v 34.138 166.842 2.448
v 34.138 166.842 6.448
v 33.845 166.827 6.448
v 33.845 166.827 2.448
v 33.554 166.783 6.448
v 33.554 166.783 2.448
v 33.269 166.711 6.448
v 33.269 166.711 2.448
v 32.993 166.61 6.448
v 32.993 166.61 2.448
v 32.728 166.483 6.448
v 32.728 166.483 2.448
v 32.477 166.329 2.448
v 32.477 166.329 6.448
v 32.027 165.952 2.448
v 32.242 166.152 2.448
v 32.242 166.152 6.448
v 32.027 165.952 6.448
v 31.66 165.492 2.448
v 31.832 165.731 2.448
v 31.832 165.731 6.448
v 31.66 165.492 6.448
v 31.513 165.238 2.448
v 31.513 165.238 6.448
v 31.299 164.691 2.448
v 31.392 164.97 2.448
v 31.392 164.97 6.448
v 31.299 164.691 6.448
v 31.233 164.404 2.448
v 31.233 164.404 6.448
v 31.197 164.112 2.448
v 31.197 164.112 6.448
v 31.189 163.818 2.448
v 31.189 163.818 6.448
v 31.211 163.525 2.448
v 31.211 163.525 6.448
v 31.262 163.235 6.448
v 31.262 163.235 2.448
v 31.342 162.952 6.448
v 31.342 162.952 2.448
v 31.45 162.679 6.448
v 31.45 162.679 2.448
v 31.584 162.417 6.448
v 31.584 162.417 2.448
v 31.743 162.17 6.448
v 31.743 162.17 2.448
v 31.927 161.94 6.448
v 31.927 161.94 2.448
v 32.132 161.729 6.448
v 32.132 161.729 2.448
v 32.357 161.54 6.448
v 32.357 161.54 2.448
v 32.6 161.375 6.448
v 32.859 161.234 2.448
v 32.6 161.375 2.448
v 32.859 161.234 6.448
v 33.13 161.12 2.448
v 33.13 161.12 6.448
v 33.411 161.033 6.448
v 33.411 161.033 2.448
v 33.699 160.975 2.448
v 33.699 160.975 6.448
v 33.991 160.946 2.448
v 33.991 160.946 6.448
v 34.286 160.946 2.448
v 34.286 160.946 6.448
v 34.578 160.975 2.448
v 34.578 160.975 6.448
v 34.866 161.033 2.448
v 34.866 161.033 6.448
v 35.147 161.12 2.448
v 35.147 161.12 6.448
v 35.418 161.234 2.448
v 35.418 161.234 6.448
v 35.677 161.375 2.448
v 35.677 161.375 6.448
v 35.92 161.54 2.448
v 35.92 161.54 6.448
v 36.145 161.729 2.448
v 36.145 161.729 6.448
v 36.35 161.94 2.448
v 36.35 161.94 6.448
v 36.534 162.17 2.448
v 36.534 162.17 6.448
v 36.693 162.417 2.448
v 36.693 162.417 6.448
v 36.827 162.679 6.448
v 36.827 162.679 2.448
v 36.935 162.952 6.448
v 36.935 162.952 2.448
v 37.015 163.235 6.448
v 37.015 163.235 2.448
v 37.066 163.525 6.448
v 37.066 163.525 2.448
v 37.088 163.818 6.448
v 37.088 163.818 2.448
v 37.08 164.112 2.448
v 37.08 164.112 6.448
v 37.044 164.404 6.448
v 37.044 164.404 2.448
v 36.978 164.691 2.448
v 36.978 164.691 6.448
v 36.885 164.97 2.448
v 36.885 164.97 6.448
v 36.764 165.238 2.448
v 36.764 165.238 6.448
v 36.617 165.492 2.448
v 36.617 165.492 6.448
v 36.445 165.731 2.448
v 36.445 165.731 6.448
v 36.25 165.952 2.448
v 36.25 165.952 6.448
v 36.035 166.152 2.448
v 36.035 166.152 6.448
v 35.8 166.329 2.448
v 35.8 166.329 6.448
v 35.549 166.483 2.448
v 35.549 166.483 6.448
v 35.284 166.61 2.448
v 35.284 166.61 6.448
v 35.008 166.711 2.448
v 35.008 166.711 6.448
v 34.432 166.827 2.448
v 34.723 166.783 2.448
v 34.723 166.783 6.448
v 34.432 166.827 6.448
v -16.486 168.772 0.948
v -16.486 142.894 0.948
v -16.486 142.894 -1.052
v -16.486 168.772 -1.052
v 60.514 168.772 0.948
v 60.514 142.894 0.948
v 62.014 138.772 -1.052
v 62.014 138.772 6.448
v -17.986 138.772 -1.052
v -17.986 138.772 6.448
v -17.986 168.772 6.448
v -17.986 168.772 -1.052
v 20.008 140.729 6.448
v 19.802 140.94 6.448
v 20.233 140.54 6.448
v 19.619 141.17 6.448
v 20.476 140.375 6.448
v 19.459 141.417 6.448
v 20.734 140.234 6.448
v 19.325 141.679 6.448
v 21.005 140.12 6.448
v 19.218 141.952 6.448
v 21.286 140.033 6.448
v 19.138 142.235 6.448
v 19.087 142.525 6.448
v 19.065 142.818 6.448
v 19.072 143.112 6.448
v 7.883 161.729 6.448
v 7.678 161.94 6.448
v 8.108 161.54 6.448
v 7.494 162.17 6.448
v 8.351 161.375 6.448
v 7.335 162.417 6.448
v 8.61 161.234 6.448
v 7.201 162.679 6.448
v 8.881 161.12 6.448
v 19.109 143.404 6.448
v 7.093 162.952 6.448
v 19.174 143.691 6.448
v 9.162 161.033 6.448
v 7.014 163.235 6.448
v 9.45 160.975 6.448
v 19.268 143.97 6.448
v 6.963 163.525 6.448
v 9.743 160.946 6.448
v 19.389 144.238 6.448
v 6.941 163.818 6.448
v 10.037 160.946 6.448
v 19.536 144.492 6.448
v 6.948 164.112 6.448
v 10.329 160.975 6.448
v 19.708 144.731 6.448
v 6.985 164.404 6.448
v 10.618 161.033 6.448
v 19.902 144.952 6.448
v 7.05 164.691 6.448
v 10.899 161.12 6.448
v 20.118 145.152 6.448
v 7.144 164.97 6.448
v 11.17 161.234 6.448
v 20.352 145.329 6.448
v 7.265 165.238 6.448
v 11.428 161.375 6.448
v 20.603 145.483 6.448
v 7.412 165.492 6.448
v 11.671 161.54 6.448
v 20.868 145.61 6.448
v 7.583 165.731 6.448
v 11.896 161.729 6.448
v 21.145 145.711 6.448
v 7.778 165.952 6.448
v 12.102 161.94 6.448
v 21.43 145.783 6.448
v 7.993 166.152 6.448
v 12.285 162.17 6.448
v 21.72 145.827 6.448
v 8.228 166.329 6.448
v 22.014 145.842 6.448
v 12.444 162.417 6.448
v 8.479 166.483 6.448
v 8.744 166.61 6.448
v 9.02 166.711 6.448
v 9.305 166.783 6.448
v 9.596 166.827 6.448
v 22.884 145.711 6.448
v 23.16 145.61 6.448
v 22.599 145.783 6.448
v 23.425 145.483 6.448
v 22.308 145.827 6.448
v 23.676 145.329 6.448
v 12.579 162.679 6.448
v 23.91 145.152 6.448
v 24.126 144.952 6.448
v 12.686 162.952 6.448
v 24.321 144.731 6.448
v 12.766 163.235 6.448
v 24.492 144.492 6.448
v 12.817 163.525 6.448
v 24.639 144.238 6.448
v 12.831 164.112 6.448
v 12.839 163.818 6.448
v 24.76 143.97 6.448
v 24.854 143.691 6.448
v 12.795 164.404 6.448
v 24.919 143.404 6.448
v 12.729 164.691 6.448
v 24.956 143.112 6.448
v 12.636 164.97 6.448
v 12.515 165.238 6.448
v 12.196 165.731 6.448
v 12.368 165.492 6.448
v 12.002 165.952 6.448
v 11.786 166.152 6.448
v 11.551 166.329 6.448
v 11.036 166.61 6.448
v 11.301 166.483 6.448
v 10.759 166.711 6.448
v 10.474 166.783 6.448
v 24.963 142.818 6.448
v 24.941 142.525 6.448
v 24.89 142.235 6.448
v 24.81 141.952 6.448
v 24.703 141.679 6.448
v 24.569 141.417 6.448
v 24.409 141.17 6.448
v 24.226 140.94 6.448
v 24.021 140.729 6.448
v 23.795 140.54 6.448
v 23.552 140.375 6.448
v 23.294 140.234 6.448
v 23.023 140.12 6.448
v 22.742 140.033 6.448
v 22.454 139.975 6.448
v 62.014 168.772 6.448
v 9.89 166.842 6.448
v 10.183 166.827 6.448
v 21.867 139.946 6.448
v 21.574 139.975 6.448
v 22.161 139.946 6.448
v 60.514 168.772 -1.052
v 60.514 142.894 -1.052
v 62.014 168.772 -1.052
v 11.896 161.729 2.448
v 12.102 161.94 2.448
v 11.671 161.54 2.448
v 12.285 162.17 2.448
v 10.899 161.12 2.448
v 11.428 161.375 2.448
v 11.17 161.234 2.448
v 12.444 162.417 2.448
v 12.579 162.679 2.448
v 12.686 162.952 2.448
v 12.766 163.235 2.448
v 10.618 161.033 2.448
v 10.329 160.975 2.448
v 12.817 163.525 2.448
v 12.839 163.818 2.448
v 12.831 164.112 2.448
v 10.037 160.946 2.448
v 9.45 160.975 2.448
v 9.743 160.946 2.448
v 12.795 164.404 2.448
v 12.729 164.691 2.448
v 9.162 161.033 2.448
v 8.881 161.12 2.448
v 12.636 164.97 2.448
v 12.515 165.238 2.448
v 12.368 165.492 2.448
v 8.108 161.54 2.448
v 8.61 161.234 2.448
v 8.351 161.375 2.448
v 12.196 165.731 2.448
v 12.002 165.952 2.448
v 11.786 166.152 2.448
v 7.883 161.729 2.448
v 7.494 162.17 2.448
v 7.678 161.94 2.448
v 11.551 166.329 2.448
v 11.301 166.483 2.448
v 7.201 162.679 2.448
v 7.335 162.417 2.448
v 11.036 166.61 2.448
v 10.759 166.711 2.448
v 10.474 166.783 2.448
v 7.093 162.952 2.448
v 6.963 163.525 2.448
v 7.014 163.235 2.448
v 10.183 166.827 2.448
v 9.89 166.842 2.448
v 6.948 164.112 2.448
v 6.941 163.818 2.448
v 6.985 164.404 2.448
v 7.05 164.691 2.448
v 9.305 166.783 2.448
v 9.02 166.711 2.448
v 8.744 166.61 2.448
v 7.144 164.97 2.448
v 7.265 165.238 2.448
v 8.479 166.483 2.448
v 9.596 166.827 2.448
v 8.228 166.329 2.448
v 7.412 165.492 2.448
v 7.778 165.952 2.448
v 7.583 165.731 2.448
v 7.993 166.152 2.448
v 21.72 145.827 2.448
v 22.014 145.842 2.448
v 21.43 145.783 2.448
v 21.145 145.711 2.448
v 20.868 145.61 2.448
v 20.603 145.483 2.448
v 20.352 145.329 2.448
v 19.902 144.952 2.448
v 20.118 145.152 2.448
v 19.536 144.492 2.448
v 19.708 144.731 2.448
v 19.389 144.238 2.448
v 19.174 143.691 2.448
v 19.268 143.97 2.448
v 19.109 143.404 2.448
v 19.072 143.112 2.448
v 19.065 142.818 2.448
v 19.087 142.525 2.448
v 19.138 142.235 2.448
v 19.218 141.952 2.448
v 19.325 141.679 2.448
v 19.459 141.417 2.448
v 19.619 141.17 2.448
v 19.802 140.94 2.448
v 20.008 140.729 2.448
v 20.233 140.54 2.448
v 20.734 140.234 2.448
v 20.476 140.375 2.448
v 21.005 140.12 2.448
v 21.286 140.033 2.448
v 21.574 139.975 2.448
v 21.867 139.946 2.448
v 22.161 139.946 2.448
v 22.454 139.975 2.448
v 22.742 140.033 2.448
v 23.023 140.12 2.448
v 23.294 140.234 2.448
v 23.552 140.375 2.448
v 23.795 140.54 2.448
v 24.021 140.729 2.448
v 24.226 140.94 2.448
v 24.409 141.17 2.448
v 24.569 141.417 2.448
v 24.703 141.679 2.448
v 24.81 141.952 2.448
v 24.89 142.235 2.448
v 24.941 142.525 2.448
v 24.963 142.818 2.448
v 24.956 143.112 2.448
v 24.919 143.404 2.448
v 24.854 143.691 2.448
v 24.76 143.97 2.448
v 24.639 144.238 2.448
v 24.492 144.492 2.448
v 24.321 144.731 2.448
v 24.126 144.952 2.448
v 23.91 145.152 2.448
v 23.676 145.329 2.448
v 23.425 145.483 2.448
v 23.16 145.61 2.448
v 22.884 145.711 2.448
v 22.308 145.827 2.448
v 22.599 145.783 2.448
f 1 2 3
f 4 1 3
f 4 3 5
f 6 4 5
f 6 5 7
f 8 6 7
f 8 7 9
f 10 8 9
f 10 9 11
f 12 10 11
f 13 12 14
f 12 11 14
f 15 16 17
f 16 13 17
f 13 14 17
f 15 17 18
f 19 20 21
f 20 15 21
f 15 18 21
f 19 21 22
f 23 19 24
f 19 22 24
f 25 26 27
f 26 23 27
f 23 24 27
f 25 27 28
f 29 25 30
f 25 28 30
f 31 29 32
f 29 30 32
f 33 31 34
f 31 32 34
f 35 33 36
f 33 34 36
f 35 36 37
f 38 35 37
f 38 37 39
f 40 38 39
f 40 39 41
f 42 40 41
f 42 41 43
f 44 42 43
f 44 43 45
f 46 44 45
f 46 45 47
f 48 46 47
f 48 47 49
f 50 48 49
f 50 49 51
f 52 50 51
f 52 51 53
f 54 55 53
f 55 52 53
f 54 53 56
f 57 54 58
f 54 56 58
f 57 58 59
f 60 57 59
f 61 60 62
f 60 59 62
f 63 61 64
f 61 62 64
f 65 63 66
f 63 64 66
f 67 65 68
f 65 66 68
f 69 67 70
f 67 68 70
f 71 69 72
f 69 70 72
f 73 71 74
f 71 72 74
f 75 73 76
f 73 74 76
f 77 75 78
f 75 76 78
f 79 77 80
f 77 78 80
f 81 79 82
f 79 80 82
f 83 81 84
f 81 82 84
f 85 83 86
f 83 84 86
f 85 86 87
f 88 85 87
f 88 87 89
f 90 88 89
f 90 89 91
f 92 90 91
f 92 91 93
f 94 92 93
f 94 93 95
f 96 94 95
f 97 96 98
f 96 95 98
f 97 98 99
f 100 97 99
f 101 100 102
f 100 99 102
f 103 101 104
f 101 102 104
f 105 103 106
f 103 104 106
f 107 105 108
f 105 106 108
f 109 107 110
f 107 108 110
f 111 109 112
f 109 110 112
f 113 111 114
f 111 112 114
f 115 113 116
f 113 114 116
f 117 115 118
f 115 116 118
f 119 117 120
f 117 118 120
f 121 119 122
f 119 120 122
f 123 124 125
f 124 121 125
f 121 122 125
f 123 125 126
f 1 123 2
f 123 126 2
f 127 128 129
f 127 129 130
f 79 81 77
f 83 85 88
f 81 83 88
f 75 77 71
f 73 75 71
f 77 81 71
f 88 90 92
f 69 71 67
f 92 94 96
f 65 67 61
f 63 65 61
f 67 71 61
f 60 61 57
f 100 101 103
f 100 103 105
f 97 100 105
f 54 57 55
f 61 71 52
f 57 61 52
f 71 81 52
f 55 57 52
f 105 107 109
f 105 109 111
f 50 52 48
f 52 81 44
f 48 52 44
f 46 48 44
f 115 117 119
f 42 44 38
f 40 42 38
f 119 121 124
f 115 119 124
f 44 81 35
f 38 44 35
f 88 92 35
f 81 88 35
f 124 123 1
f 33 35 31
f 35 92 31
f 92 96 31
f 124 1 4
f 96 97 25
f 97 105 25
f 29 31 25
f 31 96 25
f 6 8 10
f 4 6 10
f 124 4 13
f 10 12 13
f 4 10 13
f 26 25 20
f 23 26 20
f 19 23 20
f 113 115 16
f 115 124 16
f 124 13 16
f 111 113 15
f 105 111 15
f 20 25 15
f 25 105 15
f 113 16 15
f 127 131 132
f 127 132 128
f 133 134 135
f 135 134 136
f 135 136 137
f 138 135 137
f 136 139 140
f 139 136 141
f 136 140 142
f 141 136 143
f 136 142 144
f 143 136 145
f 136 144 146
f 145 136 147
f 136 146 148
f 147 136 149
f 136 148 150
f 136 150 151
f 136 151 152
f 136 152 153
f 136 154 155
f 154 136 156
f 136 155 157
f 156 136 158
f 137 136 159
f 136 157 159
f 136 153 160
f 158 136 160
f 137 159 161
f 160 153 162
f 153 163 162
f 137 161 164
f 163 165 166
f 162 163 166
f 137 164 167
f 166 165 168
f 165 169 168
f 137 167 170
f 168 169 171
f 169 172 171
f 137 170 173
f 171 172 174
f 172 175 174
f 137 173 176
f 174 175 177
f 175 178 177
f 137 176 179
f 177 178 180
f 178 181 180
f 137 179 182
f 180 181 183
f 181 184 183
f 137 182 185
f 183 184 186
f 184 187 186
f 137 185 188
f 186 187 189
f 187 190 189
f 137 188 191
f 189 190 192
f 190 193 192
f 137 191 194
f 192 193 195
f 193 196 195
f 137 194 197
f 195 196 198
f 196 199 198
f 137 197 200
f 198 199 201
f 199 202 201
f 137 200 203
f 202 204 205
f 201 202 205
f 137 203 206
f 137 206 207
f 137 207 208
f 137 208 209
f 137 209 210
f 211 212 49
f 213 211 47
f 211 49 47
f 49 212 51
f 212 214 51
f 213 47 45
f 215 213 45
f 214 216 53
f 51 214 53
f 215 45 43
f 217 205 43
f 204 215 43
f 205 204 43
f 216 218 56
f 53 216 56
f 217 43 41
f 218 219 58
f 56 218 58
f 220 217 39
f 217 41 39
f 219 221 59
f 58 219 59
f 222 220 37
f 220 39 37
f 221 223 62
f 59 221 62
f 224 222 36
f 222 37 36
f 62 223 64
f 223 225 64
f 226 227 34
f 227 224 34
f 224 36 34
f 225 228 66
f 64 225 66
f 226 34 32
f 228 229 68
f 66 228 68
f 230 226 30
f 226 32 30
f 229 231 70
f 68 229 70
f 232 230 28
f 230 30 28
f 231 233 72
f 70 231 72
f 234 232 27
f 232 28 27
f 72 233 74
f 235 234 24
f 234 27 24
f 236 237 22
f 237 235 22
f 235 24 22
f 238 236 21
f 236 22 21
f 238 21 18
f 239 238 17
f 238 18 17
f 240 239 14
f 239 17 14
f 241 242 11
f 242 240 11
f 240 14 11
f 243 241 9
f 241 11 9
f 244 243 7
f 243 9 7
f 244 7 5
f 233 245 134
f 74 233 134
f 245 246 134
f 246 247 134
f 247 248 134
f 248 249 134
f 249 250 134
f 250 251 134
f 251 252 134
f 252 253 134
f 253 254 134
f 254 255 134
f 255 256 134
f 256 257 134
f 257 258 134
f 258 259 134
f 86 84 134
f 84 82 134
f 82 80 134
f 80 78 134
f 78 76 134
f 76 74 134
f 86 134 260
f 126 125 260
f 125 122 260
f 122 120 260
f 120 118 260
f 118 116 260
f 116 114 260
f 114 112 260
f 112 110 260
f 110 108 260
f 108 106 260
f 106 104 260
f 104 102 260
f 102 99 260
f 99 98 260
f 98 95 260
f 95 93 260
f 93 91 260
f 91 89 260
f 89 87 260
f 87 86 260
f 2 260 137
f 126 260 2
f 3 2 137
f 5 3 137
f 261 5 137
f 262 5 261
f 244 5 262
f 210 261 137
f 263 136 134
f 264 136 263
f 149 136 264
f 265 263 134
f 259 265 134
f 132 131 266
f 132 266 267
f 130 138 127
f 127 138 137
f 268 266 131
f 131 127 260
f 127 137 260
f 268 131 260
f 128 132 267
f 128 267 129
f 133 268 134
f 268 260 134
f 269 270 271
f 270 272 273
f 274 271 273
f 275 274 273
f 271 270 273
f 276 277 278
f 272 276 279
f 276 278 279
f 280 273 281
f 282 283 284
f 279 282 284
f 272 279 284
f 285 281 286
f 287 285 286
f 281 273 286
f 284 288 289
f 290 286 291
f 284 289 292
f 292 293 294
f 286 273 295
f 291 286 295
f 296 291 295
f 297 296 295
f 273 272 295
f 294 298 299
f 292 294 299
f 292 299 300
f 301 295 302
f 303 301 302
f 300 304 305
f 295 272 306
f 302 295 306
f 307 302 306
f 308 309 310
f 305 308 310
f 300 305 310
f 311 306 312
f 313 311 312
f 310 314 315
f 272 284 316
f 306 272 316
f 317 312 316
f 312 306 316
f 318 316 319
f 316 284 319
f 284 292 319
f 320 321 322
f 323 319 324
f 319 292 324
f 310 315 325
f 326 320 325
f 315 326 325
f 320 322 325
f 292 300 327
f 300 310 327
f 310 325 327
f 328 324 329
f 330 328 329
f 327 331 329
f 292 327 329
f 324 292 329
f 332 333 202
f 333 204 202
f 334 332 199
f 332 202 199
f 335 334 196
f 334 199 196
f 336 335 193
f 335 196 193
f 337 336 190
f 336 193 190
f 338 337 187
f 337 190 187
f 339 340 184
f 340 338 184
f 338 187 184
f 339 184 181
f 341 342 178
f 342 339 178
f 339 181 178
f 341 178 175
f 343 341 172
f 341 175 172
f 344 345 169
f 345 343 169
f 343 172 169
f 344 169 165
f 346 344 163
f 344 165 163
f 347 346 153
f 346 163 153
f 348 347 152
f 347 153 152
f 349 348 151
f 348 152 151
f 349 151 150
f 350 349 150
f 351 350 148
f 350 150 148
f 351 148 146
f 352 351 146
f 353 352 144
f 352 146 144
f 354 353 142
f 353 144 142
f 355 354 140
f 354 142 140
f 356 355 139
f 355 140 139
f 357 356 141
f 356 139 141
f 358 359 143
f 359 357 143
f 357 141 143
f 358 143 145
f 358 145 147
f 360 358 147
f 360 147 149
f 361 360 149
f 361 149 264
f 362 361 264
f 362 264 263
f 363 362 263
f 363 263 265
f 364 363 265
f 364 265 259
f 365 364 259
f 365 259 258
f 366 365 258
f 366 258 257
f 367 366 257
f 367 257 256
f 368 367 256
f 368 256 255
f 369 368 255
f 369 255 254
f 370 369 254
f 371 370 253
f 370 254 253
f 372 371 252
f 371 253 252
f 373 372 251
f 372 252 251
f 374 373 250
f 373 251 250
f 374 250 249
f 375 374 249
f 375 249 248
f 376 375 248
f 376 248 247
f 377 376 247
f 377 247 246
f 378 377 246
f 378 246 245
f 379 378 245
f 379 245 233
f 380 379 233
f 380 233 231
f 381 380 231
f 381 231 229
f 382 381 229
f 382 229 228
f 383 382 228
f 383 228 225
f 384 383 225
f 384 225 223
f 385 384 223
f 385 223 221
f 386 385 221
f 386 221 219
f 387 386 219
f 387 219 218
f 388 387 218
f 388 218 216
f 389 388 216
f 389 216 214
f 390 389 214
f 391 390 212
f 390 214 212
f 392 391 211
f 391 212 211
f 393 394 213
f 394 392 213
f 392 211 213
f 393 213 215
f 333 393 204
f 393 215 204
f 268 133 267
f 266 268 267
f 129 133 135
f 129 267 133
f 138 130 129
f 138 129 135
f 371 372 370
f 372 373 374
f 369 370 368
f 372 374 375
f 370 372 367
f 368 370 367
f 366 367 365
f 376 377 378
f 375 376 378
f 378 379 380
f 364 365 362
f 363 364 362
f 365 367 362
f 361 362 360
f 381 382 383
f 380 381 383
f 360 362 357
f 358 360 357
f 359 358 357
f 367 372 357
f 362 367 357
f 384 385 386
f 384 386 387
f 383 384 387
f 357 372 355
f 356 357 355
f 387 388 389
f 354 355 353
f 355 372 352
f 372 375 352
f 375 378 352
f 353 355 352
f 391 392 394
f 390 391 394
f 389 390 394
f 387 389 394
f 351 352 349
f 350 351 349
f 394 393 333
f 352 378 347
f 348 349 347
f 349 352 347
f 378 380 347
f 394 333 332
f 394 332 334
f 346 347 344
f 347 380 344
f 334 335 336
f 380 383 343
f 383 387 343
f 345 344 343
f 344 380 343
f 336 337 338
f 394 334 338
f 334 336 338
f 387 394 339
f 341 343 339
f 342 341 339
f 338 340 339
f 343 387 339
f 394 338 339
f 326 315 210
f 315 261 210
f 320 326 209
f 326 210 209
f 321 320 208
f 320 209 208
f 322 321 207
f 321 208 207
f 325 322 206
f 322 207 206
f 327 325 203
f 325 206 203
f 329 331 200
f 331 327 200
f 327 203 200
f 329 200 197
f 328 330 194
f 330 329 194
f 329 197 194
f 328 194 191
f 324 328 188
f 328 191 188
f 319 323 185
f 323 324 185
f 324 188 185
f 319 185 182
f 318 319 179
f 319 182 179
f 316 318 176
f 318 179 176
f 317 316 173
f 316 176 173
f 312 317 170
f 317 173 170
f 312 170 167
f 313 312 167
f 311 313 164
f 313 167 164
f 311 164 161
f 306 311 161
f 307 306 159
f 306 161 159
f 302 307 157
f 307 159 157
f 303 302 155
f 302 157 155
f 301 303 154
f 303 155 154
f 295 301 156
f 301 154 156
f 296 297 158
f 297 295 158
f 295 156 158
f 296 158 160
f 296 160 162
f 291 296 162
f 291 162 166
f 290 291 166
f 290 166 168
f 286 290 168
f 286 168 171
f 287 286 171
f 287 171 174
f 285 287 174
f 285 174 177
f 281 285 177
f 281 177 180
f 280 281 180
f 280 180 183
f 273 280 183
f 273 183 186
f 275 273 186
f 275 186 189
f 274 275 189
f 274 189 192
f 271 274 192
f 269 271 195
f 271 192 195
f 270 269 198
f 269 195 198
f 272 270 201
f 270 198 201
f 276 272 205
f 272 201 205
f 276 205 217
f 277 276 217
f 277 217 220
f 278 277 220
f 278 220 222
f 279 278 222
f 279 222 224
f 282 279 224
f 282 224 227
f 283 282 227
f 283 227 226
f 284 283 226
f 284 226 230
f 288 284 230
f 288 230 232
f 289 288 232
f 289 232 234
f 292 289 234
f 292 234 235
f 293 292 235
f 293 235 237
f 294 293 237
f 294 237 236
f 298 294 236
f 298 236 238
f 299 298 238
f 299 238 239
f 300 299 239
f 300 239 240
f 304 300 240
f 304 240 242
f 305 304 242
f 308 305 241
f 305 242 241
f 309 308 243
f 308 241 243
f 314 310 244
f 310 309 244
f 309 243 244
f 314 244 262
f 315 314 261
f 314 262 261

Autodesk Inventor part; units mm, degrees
ref_plane "YZ Plane" through (0, 0, 0) normal (1, 0, 0) x (0, 1, 0)
ref_plane "XZ Plane" through (0, 0, 0) normal (0, 1, 0) x (-1, 0, 0)
ref_plane "XY Plane" through (0, 0, 0) normal (0, 0, 1) x (1, 0, 0)
ref_plane "Work Plane1" through (52.5141, 202.7033, 6.4479) normal (0, 0, -1) x (0, 1, 0)
sketch "Sketch1" plane through (52.5141, 202.7033, 6.4479) normal (0, 0, -1) x (0, 1, 0)
  circle A0 centre (-59.8114, -30.5) radius 2.95
  circle A1 centre (-38.8114, -18.3756) radius 2.95
  circle A2 centre (-38.8114, -42.6244) radius 2.95 construction
  circle A3 centre (-38.8114, -42.6244) radius 2.95
  line L0 (-38.8114, -42.6244) -> (-38.8114, -18.3756) construction
  line L1 (-38.8114, -18.3756) -> (-59.8114, -30.5) construction
  line L2 (-59.8114, -30.5) -> (-38.8114, -42.6244) construction
  line L3 (-63.9312, 9.5) -> (-63.9312, -70.5)
  line L4 (-63.9312, -70.5) -> (-33.9312, -70.5)
  line L5 (-33.9312, -70.5) -> (-33.9312, 9.5)
  line L6 (-33.9312, 9.5) -> (-63.9312, 9.5)
  line L7 (-63.9312, 9.5) -> (-33.9312, -70.5) construction
  line L8 (-63.9312, -70.5) -> (-33.9312, 9.5) construction
  point P0 (-202.7033, -52.5141)
  point P1 (-56.7146, -27.9576)
  point P2 (-59.6434, -27.5548)
  point P3 (-59.6434, -33.4452)
  dimension "d4" = 5.9
  dimension "d5" = 5.9
  dimension "d6" = 5.9
  dimension "d37" = 80
  dimension "d38" = 30
extrude "Extrusion1" add sketch "Sketch1" along normal blind 4
sketch "Sketch2" plane through (52.5141, 202.7033, 2.4479) normal (0, 0, -1) x (-1, 0, 0)
  circle A0 centre (42.6244, -38.8114) radius 2.95 projected
  circle A1 centre (18.3756, -38.8114) radius 2.95 projected
  circle A2 centre (30.5, -59.8114) radius 2.95 projected
  line L0 (-9.5, -63.9312) -> (70.5, -63.9312) projected
  line L1 (70.5, -63.9312) -> (70.5, -33.9312) projected
  line L2 (70.5, -33.9312) -> (-9.5, -33.9312) projected
  line L3 (-9.5, -33.9312) -> (-9.5, -63.9312) projected
  point P0 (52.5141, -202.7033)
extrude "Extrusion2" add sketch "Sketch2" along normal blind 1.5 contours A0 | A1 | A2 | L3 L2 L1 L0
sketch "Skizze7" plane through (52.5141, 202.7033, 0.9479) normal (0, 0, -1) x (-1, 0, 0)
  line L0 (70.5, -63.9312) -> (70.5, -33.9312) projected
  line L1 (70.5, -33.9312) -> (-9.5, -33.9312) projected
  line L2 (-9.5, -33.9312) -> (-9.5, -63.9312) projected
  line L3 (-9.5, -63.9312) -> (70.5, -63.9312) projected
  line L4 (-8, -59.8091) -> (69, -59.8091)
  line L5 (69, -59.8091) -> (69, -33.8091)
  line L6 (69, -33.8091) -> (-8, -33.8091)
  line L7 (-8, -33.8091) -> (-8, -59.8091)
  line L8 (-8, -59.8091) -> (69, -33.8091) construction
  line L9 (69, -59.8091) -> (-8, -33.8091) construction
  line L10 (70.5, -33.9312) -> (-9.5, -33.9312) projected
  point P0 (52.5141, -202.7033)
  point P1 (30.5, -46.8091)
  point P2 (69, -33.9312)
  point P3 (-8, -33.9312)
  point P4 (69, -33.9312)
  dimension "d39" = 77
  dimension "d40" = 26
extrude "Extrusion7" add sketch "Skizze7" along normal blind 2 contours L3 L2 L1 L7 L4 L5 L0
ref_plane "Arbeitsebene2" through (22.0141, 138.7722, 6.4479) normal (-1, 0, 0) x (0, 0, 1)
properties part number "00_cellSTORM_v5_chiptray_slidesize"
